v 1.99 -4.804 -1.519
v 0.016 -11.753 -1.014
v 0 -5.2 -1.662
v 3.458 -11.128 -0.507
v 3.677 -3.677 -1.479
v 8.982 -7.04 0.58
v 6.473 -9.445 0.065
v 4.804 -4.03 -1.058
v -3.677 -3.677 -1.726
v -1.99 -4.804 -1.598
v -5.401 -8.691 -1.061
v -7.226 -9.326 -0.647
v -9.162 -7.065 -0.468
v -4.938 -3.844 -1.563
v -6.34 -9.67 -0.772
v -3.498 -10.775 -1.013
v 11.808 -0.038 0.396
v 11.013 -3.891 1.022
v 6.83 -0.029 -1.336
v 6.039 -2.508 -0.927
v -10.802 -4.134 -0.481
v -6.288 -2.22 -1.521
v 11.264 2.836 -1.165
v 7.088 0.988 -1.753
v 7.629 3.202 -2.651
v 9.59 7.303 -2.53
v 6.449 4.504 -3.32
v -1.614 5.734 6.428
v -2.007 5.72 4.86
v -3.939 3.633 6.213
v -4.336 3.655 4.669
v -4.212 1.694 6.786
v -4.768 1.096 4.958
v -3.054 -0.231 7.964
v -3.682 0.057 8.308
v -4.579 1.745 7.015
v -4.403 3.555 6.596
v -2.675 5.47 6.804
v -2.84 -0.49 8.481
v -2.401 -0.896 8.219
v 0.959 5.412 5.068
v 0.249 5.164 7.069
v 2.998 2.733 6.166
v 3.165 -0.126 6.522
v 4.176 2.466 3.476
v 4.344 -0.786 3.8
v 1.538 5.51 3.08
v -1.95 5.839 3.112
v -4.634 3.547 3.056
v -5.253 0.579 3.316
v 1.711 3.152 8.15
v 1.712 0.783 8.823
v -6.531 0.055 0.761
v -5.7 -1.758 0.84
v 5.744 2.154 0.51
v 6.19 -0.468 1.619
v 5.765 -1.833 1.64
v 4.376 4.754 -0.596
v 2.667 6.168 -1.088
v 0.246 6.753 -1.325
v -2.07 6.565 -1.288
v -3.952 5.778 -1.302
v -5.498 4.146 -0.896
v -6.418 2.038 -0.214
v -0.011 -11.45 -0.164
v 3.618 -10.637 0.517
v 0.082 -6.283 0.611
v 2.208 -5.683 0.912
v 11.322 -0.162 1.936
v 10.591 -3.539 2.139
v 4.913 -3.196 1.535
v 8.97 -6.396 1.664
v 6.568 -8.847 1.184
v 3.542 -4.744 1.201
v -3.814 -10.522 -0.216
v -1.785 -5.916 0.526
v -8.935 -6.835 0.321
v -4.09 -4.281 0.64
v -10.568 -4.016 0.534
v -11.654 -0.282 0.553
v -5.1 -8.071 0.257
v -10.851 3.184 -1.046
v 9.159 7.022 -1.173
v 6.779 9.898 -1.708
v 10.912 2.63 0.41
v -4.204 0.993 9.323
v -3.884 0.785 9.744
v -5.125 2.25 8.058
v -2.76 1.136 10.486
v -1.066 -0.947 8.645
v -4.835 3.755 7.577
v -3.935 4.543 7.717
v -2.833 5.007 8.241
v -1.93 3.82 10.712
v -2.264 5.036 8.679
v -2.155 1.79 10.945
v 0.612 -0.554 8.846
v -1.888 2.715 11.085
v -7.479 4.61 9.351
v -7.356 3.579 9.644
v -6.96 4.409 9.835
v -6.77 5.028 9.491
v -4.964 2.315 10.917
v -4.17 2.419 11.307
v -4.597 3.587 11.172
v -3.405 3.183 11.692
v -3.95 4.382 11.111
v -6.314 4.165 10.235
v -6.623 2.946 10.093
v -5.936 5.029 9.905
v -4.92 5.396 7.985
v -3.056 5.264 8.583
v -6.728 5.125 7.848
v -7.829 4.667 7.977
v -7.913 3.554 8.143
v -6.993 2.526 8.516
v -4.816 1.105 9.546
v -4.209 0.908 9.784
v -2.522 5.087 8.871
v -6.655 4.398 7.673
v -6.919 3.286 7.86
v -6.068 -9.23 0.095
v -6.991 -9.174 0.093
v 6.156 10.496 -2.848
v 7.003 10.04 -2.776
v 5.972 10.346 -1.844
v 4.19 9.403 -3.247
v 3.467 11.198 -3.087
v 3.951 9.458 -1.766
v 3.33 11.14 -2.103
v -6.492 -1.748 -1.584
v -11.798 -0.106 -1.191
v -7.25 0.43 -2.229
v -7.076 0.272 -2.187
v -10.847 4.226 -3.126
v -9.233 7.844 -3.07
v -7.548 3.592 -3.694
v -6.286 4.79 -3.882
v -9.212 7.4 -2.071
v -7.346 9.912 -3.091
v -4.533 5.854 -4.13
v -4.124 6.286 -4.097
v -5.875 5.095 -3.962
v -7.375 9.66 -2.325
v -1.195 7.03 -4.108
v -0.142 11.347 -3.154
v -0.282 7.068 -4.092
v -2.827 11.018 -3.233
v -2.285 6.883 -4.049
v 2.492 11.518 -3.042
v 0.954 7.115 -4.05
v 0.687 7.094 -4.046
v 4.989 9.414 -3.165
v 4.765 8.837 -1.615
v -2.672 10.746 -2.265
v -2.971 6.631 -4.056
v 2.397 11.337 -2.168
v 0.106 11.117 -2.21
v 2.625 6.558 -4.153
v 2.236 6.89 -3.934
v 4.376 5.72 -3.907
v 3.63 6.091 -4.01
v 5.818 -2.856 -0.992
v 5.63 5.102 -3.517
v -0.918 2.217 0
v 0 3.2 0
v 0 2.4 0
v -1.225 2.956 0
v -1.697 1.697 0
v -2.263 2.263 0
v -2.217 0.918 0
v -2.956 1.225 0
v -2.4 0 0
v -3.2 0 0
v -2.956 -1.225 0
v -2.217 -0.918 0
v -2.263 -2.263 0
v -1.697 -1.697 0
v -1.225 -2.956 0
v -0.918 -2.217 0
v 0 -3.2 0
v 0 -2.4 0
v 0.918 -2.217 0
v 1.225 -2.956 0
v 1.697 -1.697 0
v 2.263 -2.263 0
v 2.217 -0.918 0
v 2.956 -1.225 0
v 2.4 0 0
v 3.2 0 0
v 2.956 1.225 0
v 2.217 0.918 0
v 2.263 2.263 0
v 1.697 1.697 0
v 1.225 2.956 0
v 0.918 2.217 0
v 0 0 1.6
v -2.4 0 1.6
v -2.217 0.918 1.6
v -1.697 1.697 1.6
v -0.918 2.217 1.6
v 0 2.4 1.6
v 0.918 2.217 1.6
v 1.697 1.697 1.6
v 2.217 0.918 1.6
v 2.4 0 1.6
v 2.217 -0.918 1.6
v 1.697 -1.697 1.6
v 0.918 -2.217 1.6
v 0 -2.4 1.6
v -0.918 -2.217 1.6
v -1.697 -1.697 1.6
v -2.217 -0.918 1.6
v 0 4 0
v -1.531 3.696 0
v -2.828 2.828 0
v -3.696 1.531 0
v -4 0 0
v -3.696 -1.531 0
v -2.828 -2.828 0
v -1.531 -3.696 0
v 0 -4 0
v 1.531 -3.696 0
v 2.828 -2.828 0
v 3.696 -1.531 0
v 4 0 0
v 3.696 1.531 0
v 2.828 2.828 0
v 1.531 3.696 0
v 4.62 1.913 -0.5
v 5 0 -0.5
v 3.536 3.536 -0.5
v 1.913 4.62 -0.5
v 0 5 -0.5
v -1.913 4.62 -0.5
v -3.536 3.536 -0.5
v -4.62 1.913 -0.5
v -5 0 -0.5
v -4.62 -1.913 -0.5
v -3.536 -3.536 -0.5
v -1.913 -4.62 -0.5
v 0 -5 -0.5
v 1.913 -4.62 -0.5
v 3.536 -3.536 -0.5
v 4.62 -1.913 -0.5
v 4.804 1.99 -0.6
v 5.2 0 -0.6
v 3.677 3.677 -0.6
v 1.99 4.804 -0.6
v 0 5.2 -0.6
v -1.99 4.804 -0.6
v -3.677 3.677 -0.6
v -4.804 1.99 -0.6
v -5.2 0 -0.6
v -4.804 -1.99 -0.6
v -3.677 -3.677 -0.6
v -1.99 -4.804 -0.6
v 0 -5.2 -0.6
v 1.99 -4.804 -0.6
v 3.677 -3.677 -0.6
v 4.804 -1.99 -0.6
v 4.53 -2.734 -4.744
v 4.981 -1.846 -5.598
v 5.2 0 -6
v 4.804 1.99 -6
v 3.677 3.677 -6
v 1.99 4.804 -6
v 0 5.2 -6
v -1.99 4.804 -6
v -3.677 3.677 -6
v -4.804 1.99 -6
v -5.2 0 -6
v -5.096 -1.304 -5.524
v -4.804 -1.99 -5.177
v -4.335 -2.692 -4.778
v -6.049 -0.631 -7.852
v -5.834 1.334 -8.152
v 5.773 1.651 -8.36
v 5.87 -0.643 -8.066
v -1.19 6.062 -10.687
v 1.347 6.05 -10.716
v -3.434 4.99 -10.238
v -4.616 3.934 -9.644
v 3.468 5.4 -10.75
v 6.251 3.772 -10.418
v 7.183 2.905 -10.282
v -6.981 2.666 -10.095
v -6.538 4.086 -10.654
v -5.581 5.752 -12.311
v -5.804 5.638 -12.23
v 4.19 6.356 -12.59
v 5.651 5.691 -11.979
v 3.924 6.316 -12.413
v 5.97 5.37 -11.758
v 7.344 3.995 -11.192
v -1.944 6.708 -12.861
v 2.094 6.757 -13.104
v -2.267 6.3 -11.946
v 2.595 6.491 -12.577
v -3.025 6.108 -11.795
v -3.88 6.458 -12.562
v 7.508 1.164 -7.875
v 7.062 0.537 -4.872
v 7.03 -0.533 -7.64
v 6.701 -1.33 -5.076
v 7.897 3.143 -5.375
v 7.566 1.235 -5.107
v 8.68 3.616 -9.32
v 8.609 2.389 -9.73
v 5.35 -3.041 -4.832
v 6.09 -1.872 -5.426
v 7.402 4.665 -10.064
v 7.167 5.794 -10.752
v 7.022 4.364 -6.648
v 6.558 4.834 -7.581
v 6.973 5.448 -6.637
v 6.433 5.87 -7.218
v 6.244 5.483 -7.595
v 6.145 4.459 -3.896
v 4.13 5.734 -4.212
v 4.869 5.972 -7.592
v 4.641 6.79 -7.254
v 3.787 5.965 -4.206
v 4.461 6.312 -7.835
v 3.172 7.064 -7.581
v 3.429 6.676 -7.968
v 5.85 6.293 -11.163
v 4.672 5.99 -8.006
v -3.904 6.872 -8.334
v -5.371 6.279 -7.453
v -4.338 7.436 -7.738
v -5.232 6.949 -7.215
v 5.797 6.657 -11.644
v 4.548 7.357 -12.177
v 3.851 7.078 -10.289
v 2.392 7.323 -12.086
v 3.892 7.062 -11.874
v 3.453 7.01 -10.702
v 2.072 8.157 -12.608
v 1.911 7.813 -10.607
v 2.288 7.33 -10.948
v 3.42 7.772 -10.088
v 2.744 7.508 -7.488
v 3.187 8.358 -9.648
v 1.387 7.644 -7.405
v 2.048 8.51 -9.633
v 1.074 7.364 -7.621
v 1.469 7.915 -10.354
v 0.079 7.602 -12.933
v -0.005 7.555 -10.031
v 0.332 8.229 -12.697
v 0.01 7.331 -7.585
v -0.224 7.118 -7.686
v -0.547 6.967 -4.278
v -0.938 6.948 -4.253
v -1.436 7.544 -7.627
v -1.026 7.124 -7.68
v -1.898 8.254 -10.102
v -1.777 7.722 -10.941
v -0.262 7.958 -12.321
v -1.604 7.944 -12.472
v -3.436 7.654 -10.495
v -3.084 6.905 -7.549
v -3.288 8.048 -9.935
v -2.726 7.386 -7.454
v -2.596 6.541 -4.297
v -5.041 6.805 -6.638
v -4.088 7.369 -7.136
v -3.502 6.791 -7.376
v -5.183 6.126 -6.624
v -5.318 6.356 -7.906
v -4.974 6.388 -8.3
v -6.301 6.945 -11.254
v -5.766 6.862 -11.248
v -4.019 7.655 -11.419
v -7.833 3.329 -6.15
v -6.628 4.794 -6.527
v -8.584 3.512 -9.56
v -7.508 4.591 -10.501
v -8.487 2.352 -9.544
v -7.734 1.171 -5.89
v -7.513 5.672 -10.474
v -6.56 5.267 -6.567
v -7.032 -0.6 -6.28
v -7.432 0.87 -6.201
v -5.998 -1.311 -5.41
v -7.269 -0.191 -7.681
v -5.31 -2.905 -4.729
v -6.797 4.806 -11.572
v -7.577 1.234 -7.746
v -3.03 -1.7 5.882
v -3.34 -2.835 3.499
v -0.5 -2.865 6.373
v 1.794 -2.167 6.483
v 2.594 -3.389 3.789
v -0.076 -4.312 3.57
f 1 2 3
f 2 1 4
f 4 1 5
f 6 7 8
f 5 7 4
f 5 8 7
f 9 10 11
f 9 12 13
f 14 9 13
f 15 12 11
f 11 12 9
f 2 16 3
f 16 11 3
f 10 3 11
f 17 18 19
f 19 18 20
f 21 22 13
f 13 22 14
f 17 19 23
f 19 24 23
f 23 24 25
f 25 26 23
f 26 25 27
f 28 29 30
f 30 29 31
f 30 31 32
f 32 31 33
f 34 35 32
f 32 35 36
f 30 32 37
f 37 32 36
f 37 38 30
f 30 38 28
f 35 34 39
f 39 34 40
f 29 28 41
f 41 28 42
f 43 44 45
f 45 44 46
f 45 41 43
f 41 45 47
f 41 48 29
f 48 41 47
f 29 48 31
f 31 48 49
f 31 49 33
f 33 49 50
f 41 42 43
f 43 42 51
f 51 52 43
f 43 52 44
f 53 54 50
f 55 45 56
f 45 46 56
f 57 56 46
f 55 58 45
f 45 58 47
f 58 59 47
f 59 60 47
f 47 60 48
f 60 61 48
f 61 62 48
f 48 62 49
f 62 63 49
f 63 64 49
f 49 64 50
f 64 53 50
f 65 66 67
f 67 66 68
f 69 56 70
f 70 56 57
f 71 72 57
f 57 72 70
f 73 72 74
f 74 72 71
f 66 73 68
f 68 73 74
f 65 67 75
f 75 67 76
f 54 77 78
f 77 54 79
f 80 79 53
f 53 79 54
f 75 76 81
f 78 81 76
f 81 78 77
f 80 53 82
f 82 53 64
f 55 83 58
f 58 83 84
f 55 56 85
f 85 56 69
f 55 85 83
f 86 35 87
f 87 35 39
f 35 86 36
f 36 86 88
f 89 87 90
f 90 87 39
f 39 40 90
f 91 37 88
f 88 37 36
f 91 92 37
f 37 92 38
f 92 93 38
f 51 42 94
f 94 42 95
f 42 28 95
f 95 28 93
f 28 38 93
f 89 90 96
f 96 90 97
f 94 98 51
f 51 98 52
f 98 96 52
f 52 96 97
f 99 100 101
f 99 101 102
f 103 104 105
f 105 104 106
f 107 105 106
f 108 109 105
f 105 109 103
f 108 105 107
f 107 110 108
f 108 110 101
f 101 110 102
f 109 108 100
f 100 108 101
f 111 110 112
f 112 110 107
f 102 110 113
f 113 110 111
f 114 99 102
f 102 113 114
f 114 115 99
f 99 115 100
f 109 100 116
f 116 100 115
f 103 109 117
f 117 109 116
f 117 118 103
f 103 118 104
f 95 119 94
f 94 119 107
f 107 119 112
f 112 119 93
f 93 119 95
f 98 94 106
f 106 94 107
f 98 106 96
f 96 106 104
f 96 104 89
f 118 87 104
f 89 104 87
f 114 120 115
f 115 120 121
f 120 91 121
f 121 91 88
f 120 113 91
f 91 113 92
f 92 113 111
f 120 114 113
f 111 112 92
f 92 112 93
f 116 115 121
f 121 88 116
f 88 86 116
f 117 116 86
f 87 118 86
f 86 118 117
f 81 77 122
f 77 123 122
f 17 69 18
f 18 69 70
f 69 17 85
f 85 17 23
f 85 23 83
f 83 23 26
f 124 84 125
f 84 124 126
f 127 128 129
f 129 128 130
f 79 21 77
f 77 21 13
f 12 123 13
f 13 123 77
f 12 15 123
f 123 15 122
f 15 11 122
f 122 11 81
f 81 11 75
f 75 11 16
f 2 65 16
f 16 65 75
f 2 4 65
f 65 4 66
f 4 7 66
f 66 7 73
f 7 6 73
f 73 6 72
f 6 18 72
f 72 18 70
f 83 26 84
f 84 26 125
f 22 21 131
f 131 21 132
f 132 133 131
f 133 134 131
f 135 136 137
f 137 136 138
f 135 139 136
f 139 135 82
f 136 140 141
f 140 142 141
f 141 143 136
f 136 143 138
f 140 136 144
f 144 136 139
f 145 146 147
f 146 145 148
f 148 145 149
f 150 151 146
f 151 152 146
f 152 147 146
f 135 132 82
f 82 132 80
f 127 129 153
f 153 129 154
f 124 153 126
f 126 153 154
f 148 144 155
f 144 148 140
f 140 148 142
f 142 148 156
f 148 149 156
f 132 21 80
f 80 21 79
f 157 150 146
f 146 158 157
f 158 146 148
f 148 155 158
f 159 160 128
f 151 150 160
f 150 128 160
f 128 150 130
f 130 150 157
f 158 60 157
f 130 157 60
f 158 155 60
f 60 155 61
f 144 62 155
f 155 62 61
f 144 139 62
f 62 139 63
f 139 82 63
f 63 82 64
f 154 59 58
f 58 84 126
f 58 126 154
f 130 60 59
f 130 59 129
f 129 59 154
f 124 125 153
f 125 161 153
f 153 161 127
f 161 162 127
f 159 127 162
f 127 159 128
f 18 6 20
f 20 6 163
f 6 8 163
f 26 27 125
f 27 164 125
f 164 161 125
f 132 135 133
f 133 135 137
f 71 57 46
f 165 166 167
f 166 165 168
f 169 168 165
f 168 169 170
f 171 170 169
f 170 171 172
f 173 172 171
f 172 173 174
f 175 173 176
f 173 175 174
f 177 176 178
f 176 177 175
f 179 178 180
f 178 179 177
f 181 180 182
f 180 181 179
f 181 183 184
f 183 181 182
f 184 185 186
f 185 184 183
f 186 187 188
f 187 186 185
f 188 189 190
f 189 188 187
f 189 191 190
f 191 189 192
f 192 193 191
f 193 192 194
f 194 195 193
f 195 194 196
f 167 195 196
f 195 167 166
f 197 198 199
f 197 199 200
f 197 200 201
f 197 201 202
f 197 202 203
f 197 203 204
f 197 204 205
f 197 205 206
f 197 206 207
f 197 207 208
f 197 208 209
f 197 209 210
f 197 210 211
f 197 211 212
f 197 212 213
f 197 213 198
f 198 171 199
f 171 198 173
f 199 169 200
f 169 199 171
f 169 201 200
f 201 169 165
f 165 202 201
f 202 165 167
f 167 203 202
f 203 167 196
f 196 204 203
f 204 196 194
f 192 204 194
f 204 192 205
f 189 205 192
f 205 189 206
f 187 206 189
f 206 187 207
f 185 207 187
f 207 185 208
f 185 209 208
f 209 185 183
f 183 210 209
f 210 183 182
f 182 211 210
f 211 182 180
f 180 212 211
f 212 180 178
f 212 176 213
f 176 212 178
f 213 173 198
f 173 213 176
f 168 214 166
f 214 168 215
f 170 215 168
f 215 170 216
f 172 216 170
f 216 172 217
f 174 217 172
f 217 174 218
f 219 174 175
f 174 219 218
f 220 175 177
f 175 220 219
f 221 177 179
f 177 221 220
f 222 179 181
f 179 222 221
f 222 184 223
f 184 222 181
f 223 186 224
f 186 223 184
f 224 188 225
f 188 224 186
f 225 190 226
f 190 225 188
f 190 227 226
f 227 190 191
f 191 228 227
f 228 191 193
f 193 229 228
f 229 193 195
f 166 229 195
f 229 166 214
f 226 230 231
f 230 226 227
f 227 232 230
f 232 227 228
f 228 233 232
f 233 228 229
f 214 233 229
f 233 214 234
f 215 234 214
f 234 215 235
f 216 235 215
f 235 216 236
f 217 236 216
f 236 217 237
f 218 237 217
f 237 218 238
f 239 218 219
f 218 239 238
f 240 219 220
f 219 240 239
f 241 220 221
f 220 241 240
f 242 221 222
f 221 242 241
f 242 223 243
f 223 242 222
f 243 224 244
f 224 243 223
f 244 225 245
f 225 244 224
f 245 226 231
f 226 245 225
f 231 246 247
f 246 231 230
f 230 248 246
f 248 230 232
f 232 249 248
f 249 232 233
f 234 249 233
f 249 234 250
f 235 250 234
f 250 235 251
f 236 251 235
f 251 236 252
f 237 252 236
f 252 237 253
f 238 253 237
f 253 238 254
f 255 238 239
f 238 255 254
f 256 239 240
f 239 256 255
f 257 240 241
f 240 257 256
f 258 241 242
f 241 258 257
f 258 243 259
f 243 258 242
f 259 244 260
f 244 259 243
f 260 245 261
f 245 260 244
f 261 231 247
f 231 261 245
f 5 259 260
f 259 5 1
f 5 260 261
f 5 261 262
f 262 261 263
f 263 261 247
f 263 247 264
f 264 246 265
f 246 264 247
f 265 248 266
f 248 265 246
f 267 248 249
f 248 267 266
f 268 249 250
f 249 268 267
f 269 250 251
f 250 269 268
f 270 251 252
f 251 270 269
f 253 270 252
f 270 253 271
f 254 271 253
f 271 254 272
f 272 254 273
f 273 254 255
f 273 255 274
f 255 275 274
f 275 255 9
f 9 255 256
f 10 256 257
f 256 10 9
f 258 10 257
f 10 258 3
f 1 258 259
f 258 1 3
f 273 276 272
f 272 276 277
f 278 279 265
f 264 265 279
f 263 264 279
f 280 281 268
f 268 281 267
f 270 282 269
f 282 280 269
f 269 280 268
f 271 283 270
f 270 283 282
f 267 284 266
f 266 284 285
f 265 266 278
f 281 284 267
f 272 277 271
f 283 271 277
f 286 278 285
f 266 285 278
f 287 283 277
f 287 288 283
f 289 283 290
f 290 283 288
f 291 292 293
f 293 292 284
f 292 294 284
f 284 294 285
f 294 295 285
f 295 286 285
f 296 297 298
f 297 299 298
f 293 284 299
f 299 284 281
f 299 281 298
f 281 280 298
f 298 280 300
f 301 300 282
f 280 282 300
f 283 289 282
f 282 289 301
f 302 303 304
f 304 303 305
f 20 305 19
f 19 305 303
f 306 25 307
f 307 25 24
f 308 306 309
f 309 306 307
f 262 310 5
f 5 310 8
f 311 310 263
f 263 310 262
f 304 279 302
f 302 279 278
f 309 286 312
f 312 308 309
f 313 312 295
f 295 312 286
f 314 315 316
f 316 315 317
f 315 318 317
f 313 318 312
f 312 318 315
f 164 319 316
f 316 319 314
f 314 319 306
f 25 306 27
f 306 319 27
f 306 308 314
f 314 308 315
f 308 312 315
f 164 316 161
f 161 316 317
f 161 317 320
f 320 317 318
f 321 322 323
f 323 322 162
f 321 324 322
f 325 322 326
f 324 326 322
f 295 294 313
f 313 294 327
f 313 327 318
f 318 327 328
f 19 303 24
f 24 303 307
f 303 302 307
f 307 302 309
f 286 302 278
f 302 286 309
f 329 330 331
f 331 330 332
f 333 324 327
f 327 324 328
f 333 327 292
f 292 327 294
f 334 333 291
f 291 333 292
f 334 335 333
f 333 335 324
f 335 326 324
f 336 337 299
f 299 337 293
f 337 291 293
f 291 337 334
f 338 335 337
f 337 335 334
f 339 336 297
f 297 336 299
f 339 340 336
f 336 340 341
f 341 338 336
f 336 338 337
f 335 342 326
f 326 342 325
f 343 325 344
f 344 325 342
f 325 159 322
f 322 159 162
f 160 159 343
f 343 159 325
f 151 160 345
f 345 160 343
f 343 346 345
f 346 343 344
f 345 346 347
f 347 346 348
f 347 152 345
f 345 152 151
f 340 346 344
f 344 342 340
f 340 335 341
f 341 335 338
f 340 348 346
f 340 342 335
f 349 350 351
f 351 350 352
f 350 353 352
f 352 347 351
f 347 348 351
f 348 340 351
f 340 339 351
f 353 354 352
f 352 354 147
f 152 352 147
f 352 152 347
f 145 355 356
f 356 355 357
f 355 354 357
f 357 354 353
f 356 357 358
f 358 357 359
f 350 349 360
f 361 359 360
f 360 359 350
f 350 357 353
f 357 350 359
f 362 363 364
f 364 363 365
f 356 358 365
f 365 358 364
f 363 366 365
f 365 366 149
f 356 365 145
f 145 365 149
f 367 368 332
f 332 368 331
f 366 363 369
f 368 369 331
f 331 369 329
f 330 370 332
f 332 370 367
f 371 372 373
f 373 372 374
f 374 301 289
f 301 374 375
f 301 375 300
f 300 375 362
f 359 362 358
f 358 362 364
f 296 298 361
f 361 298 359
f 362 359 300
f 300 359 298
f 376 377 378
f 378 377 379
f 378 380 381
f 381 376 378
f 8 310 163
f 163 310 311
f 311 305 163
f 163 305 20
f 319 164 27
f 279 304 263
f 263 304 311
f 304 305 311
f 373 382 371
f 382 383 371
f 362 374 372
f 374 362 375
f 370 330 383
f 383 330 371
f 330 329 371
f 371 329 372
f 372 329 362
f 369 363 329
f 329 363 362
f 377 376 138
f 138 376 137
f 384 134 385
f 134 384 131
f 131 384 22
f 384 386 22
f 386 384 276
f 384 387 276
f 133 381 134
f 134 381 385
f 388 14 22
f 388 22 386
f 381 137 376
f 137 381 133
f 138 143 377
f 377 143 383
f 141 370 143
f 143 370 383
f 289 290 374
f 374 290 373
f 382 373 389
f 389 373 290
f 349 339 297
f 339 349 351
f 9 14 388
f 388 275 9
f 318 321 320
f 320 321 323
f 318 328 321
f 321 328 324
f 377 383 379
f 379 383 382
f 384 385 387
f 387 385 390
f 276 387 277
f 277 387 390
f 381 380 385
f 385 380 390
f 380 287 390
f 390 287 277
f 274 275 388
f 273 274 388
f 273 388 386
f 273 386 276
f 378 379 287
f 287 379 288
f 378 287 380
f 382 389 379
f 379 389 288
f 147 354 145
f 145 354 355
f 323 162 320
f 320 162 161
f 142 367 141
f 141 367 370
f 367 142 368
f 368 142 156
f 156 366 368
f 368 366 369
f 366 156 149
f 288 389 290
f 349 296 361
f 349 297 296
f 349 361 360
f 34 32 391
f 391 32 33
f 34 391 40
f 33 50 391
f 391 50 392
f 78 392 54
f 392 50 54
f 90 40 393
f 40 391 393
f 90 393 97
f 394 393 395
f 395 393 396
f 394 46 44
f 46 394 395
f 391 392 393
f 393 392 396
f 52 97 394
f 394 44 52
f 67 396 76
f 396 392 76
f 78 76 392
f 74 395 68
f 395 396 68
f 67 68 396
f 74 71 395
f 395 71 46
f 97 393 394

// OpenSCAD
use <../lib.scad>
use <s/20606s01.scad>
use <s/20606s02.scad>
use <s/20606s03.scad>
function ldraw_lib__20606p03() = [
// 0 Minifig Hair Mid-Length Scraggly with Dual Mould Medium Lavender Floppy Witch Hat
// 0 Name: 20606p03.dat
// 0 Author: Lisa Winter [LisaWinter]
// 0 !LDRAW_ORG Part UPDATE 2026-07
// 0 !LICENSE Licensed under CC BY 4.0 : see CAreadme.txt
// 
// 0 BFC CERTIFY CCW
  [0,"BFC","CERTIFY"],
  [0,"BFC","CCW"],
// 
// 0 !CATEGORY Minifig Headwear
// 0 !KEYWORDS Bricklink 20606pb08, Brickowl 545240, Colour Combination
// 0 !KEYWORDS Rebrickable 20606pr0005, Set 21351
// 
// 0 !HISTORY 2026-07-30 [OrionP] Official Update 2026-07
// 
// 0 // Hat
// 1 30 0 0 0 1 0 0 0 1 0 0 0 1 s\20606s01.dat
  [1,30,0,0,0,1,0,0,0,1,0,0,0,1, ldraw_lib__s__20606s01()],
// 0 // Hair
// 1 16 0 0 0 1 0 0 0 1 0 0 0 1 s\20606s02.dat
  [1,16,0,0,0,1,0,0,0,1,0,0,0,1, ldraw_lib__s__20606s02()],
// 0 // Patternable area
// 1 30 0 0 0 1 0 0 0 1 0 0 0 1 s\20606s03.dat
  [1,30,0,0,0,1,0,0,0,1,0,0,0,1, ldraw_lib__s__20606s03()],
];
module ldraw_lib__20606p03(step=0, col=false, unit=2/5, alt=false, line=0.2, solid=!$preview)
    makepoly(ldraw_lib__20606p03(), step=step, col=col, unit=unit, alt=alt, line=line, solid=solid);
ldraw_lib__20606p03(line=0.2);
